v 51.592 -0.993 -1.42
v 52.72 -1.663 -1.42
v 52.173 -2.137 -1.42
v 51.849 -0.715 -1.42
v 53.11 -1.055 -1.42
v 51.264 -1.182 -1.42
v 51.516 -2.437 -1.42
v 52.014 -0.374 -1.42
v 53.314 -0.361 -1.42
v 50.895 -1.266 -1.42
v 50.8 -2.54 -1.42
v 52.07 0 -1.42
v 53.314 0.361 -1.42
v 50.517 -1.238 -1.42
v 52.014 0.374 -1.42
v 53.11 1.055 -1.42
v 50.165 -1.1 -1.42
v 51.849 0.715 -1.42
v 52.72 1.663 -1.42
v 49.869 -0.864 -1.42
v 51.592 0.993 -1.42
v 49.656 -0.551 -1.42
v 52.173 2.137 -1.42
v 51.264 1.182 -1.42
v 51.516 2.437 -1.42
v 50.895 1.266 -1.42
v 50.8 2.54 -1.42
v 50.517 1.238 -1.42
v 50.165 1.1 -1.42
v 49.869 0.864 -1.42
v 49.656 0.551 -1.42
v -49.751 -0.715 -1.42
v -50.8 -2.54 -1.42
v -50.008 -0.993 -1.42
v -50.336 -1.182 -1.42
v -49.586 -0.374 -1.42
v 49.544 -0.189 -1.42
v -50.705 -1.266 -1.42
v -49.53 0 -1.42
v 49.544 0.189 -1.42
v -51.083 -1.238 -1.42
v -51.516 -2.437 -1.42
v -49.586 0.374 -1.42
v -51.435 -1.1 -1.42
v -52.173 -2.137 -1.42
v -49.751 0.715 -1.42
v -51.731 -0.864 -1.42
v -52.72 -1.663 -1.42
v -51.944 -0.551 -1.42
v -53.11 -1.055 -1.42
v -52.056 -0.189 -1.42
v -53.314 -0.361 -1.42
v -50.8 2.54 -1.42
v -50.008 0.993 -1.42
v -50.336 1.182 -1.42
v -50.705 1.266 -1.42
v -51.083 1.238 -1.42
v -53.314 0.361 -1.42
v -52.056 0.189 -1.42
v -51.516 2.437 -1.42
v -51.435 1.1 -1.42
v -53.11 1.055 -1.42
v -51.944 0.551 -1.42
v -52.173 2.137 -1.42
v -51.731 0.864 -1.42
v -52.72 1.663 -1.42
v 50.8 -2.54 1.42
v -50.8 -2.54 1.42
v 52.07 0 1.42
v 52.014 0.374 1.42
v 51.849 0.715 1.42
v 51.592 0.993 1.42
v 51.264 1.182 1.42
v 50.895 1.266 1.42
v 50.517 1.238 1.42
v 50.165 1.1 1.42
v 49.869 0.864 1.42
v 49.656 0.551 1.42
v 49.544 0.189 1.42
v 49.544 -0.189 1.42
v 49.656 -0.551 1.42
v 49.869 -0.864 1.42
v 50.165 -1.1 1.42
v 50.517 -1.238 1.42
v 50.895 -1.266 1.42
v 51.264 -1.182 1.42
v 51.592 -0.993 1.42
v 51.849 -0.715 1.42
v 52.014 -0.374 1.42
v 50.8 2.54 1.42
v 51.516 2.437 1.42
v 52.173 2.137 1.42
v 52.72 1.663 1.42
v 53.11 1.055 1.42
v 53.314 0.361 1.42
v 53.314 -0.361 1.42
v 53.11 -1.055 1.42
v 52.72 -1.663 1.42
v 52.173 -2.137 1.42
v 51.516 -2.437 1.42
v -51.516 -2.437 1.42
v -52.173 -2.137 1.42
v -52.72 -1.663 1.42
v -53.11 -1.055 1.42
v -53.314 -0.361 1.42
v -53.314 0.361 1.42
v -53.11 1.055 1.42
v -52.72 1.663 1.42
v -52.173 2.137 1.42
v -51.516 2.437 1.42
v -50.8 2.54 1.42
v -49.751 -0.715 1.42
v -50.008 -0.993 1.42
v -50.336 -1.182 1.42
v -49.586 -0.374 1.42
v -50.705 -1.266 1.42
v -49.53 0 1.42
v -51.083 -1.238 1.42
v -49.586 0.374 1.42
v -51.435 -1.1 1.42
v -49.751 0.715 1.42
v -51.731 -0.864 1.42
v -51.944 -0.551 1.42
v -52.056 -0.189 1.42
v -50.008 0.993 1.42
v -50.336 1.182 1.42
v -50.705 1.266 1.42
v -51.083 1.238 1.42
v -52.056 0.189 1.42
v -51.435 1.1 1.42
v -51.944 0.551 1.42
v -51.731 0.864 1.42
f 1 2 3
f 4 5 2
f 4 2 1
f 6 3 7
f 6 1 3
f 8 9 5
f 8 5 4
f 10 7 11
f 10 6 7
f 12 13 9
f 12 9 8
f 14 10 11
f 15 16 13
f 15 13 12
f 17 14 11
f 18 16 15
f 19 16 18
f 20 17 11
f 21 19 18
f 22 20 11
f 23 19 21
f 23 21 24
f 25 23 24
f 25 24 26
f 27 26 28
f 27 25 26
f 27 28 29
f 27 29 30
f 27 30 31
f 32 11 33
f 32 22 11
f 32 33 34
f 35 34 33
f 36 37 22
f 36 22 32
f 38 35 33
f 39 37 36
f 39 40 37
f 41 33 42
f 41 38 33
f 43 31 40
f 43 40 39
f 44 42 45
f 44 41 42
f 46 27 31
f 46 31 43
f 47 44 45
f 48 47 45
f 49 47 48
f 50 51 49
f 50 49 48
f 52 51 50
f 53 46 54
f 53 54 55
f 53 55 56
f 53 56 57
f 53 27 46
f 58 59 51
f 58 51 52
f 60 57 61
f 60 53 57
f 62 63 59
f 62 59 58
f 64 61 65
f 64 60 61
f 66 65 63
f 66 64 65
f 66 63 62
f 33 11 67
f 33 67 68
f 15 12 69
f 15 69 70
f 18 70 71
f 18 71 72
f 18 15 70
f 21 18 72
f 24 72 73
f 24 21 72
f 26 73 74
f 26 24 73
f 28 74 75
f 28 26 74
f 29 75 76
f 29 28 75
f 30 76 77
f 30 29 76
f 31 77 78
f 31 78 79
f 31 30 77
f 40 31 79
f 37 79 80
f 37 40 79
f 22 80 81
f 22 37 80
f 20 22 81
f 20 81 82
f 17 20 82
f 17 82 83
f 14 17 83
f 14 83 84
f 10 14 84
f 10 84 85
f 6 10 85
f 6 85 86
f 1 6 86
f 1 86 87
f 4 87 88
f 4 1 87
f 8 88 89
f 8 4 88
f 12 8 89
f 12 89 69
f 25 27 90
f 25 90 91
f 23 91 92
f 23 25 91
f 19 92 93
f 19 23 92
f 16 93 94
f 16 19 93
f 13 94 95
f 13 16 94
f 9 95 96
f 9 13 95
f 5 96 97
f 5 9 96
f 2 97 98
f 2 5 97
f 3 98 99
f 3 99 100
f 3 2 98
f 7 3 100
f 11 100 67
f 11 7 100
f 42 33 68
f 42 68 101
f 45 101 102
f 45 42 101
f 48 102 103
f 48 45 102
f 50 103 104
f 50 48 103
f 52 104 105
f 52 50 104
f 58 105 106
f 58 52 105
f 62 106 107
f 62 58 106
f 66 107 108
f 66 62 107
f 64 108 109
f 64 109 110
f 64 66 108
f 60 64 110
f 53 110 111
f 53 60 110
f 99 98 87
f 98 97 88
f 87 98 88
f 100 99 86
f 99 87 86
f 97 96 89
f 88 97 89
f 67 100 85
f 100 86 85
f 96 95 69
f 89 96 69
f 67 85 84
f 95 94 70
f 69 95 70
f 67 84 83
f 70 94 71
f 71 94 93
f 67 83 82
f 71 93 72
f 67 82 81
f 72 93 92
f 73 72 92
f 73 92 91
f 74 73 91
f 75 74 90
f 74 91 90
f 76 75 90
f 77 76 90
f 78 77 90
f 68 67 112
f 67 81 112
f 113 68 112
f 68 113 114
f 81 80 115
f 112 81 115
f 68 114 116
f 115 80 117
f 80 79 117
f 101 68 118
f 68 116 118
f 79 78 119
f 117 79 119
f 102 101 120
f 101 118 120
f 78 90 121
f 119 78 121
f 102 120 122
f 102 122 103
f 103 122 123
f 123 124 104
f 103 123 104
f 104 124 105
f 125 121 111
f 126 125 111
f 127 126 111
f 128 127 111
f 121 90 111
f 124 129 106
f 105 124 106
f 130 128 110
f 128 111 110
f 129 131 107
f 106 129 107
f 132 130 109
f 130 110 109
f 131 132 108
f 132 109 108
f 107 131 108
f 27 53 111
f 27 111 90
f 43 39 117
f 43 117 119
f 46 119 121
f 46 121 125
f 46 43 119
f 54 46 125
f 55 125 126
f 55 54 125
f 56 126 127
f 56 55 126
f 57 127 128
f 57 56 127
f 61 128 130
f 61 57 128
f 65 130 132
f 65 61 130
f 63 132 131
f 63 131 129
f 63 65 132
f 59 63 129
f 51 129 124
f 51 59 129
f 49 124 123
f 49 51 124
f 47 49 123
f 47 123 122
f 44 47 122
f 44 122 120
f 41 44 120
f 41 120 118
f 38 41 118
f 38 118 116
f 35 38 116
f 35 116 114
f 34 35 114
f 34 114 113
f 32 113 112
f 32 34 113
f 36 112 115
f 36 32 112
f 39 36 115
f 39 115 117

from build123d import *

# Parameters (mm, degrees)
BOSS_EXTRUDE1_DEPTH      = 1.42
BOSS_EXTRUDE1_DEPTH_BACK = 1.42
SKETCH1_R                = 1.27


with BuildPart() as part:
    # Sketch1 → Boss-Extrude1 (new, two sides: drawn at the far end of the back side and taken through both)
    with BuildSketch(Plane.XY.offset(-BOSS_EXTRUDE1_DEPTH_BACK)):
        with BuildLine():
            Line((-50.8, 2.54), (50.8, 2.54))
            ThreePointArc((50.8, 2.54), (53.34, 0), (50.8, -2.54))
            Line((50.8, -2.54), (-50.8, -2.54))
            ThreePointArc((-50.8, -2.54), (-53.34, 0), (-50.8, 2.54))
        make_face()
        with Locations((-50.8, 0)):
            Circle(SKETCH1_R, mode=Mode.SUBTRACT)
        with Locations((50.8, 0)):
            Circle(SKETCH1_R, mode=Mode.SUBTRACT)
    extrude(amount=BOSS_EXTRUDE1_DEPTH + BOSS_EXTRUDE1_DEPTH_BACK)


solid = part.part
